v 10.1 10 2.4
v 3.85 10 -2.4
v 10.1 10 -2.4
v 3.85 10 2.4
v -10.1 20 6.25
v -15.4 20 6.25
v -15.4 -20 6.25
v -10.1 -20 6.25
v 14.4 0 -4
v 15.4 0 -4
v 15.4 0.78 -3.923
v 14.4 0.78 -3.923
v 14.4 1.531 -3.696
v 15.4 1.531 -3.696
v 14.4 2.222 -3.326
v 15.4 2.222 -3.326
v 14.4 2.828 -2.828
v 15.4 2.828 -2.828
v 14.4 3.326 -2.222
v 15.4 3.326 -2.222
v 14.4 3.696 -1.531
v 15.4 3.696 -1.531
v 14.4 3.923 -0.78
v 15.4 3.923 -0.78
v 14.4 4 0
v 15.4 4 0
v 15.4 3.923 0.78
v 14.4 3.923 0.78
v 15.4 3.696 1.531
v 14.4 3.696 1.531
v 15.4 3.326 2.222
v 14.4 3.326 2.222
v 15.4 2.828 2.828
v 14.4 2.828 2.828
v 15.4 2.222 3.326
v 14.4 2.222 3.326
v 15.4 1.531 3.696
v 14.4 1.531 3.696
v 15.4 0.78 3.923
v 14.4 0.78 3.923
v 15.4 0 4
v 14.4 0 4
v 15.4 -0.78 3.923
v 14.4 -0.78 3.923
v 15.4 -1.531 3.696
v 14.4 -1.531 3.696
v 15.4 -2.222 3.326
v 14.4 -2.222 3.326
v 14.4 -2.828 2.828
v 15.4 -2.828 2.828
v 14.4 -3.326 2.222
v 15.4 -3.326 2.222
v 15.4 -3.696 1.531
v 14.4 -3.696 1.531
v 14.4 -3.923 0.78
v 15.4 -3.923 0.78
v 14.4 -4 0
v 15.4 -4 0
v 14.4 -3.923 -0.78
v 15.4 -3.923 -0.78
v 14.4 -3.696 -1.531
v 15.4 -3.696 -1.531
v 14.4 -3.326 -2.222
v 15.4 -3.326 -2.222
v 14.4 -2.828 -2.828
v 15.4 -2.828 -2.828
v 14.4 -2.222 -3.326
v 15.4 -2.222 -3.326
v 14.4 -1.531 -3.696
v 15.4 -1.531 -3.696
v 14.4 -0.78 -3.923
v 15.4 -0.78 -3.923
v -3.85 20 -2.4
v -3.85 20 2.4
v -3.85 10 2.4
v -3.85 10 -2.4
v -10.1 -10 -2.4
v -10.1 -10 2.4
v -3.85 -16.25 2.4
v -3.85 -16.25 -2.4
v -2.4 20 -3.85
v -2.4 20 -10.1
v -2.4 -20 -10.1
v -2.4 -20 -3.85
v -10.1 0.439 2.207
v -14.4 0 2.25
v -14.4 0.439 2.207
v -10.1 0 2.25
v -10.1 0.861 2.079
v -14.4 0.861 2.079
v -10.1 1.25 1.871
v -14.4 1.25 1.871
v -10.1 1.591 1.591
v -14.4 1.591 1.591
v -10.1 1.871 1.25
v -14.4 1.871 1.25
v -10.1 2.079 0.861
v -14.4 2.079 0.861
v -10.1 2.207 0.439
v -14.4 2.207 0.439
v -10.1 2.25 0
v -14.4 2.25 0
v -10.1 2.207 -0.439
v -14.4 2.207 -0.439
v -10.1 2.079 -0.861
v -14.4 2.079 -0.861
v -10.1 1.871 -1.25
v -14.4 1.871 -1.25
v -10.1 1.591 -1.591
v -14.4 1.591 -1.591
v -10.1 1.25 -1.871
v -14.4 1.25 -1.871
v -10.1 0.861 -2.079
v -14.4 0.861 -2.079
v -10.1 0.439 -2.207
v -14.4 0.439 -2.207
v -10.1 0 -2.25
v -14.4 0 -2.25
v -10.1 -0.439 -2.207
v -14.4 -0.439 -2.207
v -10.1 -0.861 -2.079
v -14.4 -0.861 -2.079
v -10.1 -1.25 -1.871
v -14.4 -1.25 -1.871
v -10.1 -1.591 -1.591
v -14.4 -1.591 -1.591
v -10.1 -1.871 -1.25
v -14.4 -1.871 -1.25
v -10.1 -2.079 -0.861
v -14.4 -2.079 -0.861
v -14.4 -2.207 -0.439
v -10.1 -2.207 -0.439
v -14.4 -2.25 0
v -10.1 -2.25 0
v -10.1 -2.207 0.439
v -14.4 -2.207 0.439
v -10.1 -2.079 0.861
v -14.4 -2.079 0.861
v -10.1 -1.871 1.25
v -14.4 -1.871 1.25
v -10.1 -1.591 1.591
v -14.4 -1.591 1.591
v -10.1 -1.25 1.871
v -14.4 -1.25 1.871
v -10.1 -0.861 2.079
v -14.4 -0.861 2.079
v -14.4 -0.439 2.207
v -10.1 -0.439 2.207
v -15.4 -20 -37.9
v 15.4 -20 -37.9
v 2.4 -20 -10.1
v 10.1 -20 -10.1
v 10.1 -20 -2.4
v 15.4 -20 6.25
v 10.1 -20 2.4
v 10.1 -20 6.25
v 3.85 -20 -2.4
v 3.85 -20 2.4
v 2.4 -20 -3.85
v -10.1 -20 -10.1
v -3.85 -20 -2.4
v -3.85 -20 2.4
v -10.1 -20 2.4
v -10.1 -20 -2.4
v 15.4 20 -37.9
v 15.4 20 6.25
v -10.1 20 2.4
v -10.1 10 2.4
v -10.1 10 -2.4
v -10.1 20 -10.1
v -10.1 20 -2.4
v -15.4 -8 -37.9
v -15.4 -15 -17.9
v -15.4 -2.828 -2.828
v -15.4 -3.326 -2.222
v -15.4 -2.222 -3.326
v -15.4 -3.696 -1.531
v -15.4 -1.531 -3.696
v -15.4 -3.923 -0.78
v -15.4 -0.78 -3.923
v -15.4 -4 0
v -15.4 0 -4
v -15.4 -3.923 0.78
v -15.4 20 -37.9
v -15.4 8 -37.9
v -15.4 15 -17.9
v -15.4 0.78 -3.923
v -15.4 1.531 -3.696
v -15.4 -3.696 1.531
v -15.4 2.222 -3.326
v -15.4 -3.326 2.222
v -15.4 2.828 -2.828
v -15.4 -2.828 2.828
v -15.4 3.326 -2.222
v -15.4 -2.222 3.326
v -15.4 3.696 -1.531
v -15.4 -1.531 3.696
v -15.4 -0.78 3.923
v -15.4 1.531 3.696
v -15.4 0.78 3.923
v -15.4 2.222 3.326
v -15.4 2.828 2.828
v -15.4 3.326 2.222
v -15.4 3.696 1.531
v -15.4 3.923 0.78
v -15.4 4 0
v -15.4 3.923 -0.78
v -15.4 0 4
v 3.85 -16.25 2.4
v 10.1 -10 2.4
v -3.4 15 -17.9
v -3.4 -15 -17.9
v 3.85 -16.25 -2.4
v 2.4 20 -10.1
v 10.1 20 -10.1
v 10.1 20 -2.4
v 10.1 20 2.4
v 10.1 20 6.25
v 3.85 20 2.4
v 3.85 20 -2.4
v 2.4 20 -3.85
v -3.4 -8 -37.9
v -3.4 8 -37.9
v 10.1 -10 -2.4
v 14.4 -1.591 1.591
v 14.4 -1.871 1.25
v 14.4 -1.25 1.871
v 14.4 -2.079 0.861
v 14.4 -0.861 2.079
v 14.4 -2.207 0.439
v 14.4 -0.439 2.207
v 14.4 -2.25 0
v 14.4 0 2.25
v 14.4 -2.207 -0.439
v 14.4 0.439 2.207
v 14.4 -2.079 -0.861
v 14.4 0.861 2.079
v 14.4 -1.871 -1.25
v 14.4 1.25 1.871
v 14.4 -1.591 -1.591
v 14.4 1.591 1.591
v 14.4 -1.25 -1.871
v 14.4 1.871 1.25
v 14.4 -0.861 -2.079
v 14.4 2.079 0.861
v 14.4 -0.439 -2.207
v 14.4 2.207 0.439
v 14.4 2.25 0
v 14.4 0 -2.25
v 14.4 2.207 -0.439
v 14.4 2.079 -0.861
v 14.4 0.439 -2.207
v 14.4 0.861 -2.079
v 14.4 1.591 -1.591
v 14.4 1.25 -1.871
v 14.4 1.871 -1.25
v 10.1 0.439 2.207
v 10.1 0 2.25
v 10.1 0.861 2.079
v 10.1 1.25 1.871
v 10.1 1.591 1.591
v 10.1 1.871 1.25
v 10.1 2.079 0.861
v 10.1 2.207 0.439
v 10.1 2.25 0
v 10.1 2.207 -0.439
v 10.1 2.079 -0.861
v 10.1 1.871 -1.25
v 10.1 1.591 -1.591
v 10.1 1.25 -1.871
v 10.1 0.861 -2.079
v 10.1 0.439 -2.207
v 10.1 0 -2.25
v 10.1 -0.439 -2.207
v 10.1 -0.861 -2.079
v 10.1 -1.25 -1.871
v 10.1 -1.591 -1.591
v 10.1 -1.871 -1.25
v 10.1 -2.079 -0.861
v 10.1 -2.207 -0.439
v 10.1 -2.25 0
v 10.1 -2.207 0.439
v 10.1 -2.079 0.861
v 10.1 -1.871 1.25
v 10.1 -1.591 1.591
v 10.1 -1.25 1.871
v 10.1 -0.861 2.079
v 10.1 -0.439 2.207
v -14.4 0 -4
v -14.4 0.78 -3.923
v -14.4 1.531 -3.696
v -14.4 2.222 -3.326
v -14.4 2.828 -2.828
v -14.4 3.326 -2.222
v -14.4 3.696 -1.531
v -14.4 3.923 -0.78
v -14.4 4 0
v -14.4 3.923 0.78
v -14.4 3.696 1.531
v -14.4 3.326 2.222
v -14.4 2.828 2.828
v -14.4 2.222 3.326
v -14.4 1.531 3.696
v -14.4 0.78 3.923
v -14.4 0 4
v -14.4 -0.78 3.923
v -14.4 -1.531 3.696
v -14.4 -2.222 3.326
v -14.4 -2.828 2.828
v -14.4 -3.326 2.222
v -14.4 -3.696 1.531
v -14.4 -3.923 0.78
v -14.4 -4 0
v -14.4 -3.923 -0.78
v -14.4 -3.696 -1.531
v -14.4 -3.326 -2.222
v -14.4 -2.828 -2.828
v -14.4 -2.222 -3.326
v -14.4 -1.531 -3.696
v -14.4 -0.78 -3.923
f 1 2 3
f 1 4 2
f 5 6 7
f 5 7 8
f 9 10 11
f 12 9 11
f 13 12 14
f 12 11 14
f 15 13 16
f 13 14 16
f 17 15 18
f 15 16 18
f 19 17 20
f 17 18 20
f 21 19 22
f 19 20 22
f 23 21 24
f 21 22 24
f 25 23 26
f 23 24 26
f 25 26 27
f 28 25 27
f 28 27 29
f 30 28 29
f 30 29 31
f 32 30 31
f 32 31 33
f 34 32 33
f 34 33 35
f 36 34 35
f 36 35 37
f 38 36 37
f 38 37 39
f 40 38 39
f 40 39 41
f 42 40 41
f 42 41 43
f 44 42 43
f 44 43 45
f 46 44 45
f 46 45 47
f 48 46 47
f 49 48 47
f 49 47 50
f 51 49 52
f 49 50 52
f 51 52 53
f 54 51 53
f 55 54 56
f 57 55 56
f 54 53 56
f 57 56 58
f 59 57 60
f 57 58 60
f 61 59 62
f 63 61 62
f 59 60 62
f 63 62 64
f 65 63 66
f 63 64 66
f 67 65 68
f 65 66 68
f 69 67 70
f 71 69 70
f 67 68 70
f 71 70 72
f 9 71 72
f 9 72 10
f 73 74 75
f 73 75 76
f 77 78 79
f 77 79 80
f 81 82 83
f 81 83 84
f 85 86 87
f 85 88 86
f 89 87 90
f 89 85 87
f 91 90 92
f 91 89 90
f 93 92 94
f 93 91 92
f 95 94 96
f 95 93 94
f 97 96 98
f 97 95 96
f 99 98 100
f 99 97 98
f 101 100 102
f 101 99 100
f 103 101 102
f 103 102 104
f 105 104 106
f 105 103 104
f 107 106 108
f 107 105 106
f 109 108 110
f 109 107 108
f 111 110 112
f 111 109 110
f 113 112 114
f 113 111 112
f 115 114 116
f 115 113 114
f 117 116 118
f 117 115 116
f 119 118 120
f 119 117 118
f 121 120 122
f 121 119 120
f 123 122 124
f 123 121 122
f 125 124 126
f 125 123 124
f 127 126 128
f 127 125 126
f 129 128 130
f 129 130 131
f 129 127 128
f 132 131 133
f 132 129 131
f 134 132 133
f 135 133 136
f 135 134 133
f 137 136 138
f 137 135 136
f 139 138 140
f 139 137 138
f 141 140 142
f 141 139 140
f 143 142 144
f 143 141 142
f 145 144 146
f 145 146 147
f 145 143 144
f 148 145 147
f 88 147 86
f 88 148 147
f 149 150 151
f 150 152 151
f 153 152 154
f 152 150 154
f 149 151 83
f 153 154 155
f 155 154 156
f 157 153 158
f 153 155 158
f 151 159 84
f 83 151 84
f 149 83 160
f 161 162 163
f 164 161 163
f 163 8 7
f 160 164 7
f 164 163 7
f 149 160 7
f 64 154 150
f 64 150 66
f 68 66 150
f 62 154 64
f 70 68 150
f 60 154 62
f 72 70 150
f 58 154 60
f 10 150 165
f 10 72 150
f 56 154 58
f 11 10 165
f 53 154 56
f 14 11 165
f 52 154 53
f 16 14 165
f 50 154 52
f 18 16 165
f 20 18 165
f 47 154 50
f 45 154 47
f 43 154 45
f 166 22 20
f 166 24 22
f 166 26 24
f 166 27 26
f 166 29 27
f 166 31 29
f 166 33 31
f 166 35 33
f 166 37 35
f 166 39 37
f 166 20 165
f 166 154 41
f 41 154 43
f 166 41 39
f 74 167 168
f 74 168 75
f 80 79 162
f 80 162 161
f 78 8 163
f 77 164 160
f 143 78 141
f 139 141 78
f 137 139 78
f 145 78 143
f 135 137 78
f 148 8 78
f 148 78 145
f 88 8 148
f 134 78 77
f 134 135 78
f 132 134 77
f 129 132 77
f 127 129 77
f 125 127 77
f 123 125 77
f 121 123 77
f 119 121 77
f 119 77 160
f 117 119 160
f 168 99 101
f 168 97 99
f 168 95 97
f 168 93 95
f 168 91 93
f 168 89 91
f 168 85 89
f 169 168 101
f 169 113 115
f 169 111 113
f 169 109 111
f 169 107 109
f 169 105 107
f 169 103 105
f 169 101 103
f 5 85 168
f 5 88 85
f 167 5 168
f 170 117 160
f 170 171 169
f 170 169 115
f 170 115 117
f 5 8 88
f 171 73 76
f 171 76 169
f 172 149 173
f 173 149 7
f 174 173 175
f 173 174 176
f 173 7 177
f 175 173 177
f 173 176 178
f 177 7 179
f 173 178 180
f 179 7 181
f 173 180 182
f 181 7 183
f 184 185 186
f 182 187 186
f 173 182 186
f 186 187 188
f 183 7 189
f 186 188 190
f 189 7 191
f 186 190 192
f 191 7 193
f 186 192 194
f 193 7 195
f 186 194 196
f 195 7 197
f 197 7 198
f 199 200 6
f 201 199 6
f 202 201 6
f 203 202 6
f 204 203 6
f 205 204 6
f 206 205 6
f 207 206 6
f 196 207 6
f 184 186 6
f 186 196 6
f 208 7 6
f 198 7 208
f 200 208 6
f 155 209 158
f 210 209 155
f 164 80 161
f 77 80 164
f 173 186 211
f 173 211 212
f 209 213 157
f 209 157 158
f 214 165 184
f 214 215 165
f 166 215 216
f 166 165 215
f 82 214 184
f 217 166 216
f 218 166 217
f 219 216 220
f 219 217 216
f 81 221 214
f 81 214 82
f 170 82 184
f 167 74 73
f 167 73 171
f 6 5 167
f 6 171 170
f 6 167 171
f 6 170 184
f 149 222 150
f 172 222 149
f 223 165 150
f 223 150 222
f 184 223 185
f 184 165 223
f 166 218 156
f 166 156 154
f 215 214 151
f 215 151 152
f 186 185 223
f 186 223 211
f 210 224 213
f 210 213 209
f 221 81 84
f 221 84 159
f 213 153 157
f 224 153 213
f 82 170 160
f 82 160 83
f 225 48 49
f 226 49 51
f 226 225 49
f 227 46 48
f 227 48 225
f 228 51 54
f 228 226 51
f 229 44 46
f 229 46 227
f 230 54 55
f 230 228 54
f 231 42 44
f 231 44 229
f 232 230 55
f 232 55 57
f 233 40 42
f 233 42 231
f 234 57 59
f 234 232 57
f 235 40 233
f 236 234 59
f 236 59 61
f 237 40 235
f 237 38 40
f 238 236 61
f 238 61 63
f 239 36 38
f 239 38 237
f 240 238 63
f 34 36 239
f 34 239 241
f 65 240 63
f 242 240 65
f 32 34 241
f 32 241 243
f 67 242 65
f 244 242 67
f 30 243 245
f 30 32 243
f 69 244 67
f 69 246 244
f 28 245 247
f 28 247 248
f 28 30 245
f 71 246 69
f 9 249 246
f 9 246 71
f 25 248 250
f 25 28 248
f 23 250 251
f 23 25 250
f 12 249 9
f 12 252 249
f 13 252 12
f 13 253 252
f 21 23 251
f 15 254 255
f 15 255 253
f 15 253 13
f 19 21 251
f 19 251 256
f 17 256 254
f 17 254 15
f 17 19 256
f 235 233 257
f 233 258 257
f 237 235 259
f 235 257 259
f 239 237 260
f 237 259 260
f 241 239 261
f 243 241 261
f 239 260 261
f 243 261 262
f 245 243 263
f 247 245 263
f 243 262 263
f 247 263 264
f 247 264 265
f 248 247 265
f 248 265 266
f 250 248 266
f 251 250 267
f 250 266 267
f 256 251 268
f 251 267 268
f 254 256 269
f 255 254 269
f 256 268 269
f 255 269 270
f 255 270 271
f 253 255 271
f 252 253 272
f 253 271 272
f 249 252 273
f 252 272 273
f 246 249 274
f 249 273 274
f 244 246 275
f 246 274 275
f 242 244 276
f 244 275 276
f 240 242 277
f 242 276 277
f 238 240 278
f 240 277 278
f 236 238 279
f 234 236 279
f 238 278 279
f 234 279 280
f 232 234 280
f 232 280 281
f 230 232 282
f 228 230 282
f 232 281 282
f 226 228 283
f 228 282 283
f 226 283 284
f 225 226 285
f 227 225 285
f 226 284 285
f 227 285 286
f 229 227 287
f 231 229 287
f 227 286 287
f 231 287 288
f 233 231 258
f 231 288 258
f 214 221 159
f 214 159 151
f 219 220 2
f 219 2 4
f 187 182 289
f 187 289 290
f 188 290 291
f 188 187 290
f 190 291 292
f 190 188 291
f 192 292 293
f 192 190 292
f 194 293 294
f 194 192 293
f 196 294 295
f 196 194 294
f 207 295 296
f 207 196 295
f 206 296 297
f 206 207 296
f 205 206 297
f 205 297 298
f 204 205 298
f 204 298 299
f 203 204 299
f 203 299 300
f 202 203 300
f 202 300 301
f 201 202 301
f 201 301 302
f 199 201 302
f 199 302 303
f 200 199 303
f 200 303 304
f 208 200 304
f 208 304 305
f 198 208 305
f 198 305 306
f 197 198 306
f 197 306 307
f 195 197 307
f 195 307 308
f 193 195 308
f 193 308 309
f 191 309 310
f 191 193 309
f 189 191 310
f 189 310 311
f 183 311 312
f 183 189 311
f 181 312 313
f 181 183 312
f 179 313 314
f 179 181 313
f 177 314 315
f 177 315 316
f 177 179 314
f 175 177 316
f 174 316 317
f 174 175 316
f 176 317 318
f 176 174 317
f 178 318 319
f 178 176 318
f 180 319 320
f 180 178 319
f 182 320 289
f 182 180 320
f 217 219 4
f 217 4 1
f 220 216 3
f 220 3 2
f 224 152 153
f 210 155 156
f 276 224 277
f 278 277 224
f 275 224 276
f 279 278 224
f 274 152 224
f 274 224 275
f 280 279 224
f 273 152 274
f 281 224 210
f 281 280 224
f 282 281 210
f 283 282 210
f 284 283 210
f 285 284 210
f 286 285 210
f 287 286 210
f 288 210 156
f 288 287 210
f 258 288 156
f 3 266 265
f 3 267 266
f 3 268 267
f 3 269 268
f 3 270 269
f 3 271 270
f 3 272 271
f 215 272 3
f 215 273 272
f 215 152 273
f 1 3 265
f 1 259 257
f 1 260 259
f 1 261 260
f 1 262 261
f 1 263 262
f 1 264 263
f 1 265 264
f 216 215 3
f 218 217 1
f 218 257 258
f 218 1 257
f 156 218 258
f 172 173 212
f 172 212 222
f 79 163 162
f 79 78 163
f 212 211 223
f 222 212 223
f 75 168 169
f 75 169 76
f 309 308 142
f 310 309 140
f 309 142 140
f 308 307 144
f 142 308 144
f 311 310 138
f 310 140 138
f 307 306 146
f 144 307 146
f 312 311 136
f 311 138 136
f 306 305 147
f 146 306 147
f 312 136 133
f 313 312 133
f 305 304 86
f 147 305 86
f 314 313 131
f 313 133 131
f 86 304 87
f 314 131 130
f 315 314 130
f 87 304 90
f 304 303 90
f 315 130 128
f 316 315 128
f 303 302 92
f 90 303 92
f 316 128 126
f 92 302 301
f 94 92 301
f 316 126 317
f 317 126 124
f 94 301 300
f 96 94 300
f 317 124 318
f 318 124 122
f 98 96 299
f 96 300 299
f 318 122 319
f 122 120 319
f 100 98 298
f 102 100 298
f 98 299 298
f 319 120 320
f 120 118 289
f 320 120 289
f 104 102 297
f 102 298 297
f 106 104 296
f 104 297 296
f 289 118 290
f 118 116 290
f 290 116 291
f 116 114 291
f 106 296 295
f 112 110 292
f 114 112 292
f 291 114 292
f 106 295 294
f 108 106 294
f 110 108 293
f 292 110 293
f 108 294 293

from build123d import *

# Parameters (mm, degrees)
BOSS_EXTRU_1_DEPTH                                = 20
CHAMBRAGE_POUR_VIS_SIX_PANS_CREUX_M41_D           = 4.5
CHAMBRAGE_POUR_VIS_SIX_PANS_CREUX_M41_DEPTH       = 11.55
CHAMBRAGE_POUR_VIS_SIX_PANS_CREUX_M41_CBORE_D     = 8
CHAMBRAGE_POUR_VIS_SIX_PANS_CREUX_M41_CBORE_DEPTH = 1
ESQUISSE6_W                                       = 20.2
ESQUISSE6_H                                       = 20
ENL_V_MAT_EXTRU_1_DEPTH                           = 3
ESQUISSE14_W                                      = 30.8
ESQUISSE14_H                                      = 2.5
BOSS_EXTRU_3_DEPTH                                = 40
CHANFREIN1_SIZE                                   = 6.25
ESQUISSE15_W                                      = 30.8
ESQUISSE15_H                                      = 40
BOSS_EXTRU_4_DEPTH                                = 20
ENL_V_MAT_EXTRU_2_DEPTH                           = 12


with BuildPart() as part:
    # Base → Boss.-Extru.1 (new, symmetric)
    with BuildSketch(Plane(origin=(0, 0, 0), x_dir=(1, 0, 0), z_dir=(0, 1, 0))):
        Polygon((-3.85, -2.4), (-3.85, 2.4), (-10.1, 2.4), (-10.1, 10.1), (-2.4, 10.1), (-2.4, 3.85), (2.4, 3.85), (2.4, 10.1), (10.1, 10.1), (10.1, 2.4), (3.85, 2.4), (3.85, -2.4), (10.1, -2.4), (10.1, -6.25), (15.4, -6.25), (15.4, 15.4), (-15.4, 15.4), (-15.4, -6.25), (-10.1, -6.25), (-10.1, -2.4), align=None)
    extrude(amount=BOSS_EXTRU_1_DEPTH, both=True)

    # Chambrage pour vis à six pans creux M41
    with Locations(Plane(origin=(15.4, 0, 0), x_dir=(0, 0, -1), z_dir=(1, 0, 0))):
        with Locations((0, 0)):
            chambrage_pour_vis_six_pans_creux_m41 = CounterBoreHole(CHAMBRAGE_POUR_VIS_SIX_PANS_CREUX_M41_D / 2, CHAMBRAGE_POUR_VIS_SIX_PANS_CREUX_M41_CBORE_D / 2, CHAMBRAGE_POUR_VIS_SIX_PANS_CREUX_M41_CBORE_DEPTH, depth=CHAMBRAGE_POUR_VIS_SIX_PANS_CREUX_M41_DEPTH)

    # Symétrie1: Chambrage pour vis à six pans creux M41 across plane
    add(chambrage_pour_vis_six_pans_creux_m41.mirror(Plane(origin=(0, 0, 0), x_dir=(0, 0, 1), z_dir=(1, 0, 0))), mode=Mode.SUBTRACT)

    # Esquisse6 → Enlèv. mat.-Extru.1 (cut, symmetric)
    with BuildSketch(Plane.XY):
        Rectangle(ESQUISSE6_W, ESQUISSE6_H)
    extrude(amount=ENL_V_MAT_EXTRU_1_DEPTH, both=True, mode=Mode.SUBTRACT)

    # Esquisse14 → Boss.-Extru.3 (add)
    with BuildSketch(Plane.XZ.offset(20)):
        with Locations((0, -16.65)):
            Rectangle(ESQUISSE14_W, ESQUISSE14_H)
    extrude(amount=-BOSS_EXTRU_3_DEPTH)

    # Chanfrein1
    chanfrein1_edges = [part.edges().sort_by_distance(p)[0] for p in [
        (3.85, -10, 0),
        (-3.85, -10, 0),
    ]]
    chamfer(chanfrein1_edges, length=CHANFREIN1_SIZE - 0.0001)  # a hair under: the kernel refuses the full size

    # Esquisse15 → Boss.-Extru.4 (add)
    with BuildSketch(Plane(origin=(0, 0, -17.9), x_dir=(-1, 0, 0), z_dir=(0, 0, -1))):
        Rectangle(ESQUISSE15_W, ESQUISSE15_H)
    extrude(amount=BOSS_EXTRU_4_DEPTH)

    # Esquisse17 → Enlèv. mat.-Extru.2 (cut)
    with BuildSketch(Plane.ZY.offset(15.4)):
        Polygon((-37.9, -8), (-37.9, 8), (-17.9, 15), (-17.9, -15), align=None)
    extrude(amount=-ENL_V_MAT_EXTRU_2_DEPTH, mode=Mode.SUBTRACT)


solid = part.part
